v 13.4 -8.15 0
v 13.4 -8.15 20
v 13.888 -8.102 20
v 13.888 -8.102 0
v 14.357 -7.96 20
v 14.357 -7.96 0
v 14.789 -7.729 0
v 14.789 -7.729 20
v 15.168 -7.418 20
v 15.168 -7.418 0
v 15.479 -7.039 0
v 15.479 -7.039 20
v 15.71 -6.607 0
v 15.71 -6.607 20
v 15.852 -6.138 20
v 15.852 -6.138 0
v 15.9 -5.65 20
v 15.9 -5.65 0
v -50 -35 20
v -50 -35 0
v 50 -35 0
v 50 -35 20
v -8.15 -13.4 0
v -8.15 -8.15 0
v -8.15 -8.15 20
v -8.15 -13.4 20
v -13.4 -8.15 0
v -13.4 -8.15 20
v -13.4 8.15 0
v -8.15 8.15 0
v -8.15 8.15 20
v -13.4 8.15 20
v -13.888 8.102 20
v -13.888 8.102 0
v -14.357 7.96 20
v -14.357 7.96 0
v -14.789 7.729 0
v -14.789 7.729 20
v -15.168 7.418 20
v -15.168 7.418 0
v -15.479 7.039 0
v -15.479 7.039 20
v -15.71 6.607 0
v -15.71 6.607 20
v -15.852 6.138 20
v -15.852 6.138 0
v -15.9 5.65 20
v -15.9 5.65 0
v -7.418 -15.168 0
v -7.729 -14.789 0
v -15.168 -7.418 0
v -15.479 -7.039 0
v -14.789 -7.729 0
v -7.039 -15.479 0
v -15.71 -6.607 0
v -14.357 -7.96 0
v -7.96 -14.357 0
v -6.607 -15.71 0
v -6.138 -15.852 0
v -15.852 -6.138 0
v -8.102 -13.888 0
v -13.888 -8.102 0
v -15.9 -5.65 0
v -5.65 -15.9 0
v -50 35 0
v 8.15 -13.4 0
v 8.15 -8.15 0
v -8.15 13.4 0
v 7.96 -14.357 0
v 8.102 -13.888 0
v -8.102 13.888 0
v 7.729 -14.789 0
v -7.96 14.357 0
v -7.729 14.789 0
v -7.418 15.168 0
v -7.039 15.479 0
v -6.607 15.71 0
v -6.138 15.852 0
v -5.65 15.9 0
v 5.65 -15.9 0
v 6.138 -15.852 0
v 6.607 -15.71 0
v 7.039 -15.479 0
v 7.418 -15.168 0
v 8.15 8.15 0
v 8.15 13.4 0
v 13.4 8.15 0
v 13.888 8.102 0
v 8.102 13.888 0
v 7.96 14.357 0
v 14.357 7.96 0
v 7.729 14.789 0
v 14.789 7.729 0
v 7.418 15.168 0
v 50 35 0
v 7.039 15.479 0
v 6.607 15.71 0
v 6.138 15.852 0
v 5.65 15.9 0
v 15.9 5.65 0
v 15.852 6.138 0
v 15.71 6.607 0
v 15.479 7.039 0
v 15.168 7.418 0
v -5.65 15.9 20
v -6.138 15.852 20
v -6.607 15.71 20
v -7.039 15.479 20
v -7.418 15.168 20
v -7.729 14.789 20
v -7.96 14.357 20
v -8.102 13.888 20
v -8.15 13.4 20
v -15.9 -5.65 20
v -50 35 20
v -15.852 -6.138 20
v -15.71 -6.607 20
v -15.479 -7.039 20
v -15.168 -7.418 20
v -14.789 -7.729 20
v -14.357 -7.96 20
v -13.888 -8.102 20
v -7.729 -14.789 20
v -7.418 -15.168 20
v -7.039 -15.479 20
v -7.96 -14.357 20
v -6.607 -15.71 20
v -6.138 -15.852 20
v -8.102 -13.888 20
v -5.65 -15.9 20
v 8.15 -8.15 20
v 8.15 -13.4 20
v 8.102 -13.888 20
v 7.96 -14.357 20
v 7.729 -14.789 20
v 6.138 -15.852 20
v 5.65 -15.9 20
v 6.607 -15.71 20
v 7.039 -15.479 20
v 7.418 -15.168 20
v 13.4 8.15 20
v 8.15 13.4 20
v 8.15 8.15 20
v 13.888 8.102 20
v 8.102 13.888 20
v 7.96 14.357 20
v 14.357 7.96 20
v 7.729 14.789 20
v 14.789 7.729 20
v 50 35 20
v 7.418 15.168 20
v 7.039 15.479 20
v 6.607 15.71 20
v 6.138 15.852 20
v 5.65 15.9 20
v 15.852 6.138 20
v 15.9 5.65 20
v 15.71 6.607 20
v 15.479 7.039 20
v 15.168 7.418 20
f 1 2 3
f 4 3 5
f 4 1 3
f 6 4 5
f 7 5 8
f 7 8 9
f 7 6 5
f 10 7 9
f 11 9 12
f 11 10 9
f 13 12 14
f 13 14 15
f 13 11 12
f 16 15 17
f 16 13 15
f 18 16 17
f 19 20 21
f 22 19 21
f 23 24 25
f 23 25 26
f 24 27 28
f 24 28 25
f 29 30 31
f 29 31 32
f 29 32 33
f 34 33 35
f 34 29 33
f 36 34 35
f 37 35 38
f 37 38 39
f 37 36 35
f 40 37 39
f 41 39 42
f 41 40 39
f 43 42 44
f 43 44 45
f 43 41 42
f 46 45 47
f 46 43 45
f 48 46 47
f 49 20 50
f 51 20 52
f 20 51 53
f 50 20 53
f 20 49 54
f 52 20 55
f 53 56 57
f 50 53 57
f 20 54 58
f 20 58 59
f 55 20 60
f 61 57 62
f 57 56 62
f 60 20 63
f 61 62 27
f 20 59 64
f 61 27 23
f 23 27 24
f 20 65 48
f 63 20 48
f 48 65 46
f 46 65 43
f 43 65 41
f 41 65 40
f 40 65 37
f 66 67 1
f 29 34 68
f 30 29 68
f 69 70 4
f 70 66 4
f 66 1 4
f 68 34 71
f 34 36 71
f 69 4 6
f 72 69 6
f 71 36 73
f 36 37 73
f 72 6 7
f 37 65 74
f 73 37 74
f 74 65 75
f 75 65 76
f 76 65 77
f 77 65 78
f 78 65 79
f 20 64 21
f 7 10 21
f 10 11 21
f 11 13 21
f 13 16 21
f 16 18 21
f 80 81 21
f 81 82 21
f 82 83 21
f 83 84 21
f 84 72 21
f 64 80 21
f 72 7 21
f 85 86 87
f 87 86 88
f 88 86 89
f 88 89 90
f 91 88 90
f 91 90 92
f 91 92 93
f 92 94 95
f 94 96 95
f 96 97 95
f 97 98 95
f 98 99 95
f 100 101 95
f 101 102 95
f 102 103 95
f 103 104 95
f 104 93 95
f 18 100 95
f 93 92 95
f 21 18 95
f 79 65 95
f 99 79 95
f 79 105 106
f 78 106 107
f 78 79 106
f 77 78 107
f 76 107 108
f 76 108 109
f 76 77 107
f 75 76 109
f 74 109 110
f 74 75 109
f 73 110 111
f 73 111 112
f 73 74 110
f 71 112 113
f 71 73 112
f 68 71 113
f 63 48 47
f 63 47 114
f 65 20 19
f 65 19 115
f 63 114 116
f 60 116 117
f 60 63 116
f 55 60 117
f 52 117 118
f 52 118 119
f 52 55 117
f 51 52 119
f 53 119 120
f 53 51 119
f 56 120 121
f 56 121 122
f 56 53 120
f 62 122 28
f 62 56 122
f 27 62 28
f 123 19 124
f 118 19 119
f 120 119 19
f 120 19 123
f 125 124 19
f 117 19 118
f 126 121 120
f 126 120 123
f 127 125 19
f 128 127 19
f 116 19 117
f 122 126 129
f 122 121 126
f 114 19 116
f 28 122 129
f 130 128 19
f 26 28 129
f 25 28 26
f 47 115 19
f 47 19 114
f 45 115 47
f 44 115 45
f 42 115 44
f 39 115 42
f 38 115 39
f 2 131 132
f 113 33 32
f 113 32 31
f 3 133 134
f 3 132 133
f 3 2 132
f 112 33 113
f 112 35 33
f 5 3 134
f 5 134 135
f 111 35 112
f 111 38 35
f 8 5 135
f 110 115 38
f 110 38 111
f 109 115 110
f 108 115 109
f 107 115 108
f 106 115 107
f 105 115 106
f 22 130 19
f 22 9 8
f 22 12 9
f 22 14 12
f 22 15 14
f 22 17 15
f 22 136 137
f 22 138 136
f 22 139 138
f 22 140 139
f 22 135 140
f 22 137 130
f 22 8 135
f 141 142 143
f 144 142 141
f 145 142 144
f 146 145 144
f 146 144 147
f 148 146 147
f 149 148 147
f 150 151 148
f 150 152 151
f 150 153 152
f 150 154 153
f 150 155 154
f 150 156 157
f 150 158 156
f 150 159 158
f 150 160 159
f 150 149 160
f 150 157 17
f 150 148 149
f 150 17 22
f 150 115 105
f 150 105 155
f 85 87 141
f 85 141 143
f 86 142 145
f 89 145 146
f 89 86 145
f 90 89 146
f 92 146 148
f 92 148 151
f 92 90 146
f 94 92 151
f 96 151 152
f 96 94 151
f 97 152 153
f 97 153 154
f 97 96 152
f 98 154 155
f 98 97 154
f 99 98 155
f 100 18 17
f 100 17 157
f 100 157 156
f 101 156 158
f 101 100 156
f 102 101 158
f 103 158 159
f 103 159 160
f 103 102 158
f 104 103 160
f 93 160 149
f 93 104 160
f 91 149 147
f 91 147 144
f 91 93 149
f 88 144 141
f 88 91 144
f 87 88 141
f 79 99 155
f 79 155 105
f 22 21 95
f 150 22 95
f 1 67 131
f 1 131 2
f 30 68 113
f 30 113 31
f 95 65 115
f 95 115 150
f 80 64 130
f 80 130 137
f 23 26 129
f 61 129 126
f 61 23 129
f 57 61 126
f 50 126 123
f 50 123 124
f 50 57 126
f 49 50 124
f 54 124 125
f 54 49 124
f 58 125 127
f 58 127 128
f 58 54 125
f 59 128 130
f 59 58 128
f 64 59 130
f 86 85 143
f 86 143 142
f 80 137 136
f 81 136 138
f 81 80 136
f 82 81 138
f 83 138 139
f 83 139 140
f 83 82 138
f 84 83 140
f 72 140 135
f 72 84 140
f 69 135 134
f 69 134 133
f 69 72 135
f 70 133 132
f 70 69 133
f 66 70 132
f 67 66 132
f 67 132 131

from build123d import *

# Parameters (mm, degrees)
SKETCH1_W           = 100
SKETCH1_H           = 70
BOSS_EXTRUDE1_DEPTH = 20


with BuildPart() as part:
    # Sketch1 → Boss-Extrude1 (new body)
    with BuildSketch(Plane.XY):
        Rectangle(SKETCH1_W, SKETCH1_H)
        with BuildLine():
            Line((-8.15, 13.4), (-8.15, 8.15))
            Line((-8.15, 8.15), (-13.4, 8.15))
            ThreePointArc((-13.4, 8.15), (-15.167766953, 7.417766953), (-15.9, 5.65))
            Line((-15.9, 5.65), (-15.9, -5.65))
            ThreePointArc((-15.9, -5.65), (-15.167766953, -7.417766953), (-13.4, -8.15))
            Line((-13.4, -8.15), (-8.15, -8.15))
            Line((-8.15, -8.15), (-8.15, -13.4))
            ThreePointArc((-8.15, -13.4), (-7.417766953, -15.167766953), (-5.65, -15.9))
            Line((-5.65, -15.9), (5.65, -15.9))
            ThreePointArc((5.65, -15.9), (7.417766953, -15.167766953), (8.15, -13.4))
            Line((8.15, -13.4), (8.15, -8.15))
            Line((8.15, -8.15), (13.4, -8.15))
            ThreePointArc((13.4, -8.15), (15.167766953, -7.417766953), (15.9, -5.65))
            Line((15.9, -5.65), (15.9, 5.65))
            ThreePointArc((15.9, 5.65), (15.167766953, 7.417766953), (13.4, 8.15))
            Line((13.4, 8.15), (8.15, 8.15))
            Line((8.15, 8.15), (8.15, 13.4))
            ThreePointArc((8.15, 13.4), (7.417766953, 15.167766953), (5.65, 15.9))
            Line((5.65, 15.9), (-5.65, 15.9))
            ThreePointArc((-5.65, 15.9), (-7.417766953, 15.167766953), (-8.15, 13.4))
        make_face(mode=Mode.SUBTRACT)
    extrude(amount=BOSS_EXTRUDE1_DEPTH)


solid = part.part
